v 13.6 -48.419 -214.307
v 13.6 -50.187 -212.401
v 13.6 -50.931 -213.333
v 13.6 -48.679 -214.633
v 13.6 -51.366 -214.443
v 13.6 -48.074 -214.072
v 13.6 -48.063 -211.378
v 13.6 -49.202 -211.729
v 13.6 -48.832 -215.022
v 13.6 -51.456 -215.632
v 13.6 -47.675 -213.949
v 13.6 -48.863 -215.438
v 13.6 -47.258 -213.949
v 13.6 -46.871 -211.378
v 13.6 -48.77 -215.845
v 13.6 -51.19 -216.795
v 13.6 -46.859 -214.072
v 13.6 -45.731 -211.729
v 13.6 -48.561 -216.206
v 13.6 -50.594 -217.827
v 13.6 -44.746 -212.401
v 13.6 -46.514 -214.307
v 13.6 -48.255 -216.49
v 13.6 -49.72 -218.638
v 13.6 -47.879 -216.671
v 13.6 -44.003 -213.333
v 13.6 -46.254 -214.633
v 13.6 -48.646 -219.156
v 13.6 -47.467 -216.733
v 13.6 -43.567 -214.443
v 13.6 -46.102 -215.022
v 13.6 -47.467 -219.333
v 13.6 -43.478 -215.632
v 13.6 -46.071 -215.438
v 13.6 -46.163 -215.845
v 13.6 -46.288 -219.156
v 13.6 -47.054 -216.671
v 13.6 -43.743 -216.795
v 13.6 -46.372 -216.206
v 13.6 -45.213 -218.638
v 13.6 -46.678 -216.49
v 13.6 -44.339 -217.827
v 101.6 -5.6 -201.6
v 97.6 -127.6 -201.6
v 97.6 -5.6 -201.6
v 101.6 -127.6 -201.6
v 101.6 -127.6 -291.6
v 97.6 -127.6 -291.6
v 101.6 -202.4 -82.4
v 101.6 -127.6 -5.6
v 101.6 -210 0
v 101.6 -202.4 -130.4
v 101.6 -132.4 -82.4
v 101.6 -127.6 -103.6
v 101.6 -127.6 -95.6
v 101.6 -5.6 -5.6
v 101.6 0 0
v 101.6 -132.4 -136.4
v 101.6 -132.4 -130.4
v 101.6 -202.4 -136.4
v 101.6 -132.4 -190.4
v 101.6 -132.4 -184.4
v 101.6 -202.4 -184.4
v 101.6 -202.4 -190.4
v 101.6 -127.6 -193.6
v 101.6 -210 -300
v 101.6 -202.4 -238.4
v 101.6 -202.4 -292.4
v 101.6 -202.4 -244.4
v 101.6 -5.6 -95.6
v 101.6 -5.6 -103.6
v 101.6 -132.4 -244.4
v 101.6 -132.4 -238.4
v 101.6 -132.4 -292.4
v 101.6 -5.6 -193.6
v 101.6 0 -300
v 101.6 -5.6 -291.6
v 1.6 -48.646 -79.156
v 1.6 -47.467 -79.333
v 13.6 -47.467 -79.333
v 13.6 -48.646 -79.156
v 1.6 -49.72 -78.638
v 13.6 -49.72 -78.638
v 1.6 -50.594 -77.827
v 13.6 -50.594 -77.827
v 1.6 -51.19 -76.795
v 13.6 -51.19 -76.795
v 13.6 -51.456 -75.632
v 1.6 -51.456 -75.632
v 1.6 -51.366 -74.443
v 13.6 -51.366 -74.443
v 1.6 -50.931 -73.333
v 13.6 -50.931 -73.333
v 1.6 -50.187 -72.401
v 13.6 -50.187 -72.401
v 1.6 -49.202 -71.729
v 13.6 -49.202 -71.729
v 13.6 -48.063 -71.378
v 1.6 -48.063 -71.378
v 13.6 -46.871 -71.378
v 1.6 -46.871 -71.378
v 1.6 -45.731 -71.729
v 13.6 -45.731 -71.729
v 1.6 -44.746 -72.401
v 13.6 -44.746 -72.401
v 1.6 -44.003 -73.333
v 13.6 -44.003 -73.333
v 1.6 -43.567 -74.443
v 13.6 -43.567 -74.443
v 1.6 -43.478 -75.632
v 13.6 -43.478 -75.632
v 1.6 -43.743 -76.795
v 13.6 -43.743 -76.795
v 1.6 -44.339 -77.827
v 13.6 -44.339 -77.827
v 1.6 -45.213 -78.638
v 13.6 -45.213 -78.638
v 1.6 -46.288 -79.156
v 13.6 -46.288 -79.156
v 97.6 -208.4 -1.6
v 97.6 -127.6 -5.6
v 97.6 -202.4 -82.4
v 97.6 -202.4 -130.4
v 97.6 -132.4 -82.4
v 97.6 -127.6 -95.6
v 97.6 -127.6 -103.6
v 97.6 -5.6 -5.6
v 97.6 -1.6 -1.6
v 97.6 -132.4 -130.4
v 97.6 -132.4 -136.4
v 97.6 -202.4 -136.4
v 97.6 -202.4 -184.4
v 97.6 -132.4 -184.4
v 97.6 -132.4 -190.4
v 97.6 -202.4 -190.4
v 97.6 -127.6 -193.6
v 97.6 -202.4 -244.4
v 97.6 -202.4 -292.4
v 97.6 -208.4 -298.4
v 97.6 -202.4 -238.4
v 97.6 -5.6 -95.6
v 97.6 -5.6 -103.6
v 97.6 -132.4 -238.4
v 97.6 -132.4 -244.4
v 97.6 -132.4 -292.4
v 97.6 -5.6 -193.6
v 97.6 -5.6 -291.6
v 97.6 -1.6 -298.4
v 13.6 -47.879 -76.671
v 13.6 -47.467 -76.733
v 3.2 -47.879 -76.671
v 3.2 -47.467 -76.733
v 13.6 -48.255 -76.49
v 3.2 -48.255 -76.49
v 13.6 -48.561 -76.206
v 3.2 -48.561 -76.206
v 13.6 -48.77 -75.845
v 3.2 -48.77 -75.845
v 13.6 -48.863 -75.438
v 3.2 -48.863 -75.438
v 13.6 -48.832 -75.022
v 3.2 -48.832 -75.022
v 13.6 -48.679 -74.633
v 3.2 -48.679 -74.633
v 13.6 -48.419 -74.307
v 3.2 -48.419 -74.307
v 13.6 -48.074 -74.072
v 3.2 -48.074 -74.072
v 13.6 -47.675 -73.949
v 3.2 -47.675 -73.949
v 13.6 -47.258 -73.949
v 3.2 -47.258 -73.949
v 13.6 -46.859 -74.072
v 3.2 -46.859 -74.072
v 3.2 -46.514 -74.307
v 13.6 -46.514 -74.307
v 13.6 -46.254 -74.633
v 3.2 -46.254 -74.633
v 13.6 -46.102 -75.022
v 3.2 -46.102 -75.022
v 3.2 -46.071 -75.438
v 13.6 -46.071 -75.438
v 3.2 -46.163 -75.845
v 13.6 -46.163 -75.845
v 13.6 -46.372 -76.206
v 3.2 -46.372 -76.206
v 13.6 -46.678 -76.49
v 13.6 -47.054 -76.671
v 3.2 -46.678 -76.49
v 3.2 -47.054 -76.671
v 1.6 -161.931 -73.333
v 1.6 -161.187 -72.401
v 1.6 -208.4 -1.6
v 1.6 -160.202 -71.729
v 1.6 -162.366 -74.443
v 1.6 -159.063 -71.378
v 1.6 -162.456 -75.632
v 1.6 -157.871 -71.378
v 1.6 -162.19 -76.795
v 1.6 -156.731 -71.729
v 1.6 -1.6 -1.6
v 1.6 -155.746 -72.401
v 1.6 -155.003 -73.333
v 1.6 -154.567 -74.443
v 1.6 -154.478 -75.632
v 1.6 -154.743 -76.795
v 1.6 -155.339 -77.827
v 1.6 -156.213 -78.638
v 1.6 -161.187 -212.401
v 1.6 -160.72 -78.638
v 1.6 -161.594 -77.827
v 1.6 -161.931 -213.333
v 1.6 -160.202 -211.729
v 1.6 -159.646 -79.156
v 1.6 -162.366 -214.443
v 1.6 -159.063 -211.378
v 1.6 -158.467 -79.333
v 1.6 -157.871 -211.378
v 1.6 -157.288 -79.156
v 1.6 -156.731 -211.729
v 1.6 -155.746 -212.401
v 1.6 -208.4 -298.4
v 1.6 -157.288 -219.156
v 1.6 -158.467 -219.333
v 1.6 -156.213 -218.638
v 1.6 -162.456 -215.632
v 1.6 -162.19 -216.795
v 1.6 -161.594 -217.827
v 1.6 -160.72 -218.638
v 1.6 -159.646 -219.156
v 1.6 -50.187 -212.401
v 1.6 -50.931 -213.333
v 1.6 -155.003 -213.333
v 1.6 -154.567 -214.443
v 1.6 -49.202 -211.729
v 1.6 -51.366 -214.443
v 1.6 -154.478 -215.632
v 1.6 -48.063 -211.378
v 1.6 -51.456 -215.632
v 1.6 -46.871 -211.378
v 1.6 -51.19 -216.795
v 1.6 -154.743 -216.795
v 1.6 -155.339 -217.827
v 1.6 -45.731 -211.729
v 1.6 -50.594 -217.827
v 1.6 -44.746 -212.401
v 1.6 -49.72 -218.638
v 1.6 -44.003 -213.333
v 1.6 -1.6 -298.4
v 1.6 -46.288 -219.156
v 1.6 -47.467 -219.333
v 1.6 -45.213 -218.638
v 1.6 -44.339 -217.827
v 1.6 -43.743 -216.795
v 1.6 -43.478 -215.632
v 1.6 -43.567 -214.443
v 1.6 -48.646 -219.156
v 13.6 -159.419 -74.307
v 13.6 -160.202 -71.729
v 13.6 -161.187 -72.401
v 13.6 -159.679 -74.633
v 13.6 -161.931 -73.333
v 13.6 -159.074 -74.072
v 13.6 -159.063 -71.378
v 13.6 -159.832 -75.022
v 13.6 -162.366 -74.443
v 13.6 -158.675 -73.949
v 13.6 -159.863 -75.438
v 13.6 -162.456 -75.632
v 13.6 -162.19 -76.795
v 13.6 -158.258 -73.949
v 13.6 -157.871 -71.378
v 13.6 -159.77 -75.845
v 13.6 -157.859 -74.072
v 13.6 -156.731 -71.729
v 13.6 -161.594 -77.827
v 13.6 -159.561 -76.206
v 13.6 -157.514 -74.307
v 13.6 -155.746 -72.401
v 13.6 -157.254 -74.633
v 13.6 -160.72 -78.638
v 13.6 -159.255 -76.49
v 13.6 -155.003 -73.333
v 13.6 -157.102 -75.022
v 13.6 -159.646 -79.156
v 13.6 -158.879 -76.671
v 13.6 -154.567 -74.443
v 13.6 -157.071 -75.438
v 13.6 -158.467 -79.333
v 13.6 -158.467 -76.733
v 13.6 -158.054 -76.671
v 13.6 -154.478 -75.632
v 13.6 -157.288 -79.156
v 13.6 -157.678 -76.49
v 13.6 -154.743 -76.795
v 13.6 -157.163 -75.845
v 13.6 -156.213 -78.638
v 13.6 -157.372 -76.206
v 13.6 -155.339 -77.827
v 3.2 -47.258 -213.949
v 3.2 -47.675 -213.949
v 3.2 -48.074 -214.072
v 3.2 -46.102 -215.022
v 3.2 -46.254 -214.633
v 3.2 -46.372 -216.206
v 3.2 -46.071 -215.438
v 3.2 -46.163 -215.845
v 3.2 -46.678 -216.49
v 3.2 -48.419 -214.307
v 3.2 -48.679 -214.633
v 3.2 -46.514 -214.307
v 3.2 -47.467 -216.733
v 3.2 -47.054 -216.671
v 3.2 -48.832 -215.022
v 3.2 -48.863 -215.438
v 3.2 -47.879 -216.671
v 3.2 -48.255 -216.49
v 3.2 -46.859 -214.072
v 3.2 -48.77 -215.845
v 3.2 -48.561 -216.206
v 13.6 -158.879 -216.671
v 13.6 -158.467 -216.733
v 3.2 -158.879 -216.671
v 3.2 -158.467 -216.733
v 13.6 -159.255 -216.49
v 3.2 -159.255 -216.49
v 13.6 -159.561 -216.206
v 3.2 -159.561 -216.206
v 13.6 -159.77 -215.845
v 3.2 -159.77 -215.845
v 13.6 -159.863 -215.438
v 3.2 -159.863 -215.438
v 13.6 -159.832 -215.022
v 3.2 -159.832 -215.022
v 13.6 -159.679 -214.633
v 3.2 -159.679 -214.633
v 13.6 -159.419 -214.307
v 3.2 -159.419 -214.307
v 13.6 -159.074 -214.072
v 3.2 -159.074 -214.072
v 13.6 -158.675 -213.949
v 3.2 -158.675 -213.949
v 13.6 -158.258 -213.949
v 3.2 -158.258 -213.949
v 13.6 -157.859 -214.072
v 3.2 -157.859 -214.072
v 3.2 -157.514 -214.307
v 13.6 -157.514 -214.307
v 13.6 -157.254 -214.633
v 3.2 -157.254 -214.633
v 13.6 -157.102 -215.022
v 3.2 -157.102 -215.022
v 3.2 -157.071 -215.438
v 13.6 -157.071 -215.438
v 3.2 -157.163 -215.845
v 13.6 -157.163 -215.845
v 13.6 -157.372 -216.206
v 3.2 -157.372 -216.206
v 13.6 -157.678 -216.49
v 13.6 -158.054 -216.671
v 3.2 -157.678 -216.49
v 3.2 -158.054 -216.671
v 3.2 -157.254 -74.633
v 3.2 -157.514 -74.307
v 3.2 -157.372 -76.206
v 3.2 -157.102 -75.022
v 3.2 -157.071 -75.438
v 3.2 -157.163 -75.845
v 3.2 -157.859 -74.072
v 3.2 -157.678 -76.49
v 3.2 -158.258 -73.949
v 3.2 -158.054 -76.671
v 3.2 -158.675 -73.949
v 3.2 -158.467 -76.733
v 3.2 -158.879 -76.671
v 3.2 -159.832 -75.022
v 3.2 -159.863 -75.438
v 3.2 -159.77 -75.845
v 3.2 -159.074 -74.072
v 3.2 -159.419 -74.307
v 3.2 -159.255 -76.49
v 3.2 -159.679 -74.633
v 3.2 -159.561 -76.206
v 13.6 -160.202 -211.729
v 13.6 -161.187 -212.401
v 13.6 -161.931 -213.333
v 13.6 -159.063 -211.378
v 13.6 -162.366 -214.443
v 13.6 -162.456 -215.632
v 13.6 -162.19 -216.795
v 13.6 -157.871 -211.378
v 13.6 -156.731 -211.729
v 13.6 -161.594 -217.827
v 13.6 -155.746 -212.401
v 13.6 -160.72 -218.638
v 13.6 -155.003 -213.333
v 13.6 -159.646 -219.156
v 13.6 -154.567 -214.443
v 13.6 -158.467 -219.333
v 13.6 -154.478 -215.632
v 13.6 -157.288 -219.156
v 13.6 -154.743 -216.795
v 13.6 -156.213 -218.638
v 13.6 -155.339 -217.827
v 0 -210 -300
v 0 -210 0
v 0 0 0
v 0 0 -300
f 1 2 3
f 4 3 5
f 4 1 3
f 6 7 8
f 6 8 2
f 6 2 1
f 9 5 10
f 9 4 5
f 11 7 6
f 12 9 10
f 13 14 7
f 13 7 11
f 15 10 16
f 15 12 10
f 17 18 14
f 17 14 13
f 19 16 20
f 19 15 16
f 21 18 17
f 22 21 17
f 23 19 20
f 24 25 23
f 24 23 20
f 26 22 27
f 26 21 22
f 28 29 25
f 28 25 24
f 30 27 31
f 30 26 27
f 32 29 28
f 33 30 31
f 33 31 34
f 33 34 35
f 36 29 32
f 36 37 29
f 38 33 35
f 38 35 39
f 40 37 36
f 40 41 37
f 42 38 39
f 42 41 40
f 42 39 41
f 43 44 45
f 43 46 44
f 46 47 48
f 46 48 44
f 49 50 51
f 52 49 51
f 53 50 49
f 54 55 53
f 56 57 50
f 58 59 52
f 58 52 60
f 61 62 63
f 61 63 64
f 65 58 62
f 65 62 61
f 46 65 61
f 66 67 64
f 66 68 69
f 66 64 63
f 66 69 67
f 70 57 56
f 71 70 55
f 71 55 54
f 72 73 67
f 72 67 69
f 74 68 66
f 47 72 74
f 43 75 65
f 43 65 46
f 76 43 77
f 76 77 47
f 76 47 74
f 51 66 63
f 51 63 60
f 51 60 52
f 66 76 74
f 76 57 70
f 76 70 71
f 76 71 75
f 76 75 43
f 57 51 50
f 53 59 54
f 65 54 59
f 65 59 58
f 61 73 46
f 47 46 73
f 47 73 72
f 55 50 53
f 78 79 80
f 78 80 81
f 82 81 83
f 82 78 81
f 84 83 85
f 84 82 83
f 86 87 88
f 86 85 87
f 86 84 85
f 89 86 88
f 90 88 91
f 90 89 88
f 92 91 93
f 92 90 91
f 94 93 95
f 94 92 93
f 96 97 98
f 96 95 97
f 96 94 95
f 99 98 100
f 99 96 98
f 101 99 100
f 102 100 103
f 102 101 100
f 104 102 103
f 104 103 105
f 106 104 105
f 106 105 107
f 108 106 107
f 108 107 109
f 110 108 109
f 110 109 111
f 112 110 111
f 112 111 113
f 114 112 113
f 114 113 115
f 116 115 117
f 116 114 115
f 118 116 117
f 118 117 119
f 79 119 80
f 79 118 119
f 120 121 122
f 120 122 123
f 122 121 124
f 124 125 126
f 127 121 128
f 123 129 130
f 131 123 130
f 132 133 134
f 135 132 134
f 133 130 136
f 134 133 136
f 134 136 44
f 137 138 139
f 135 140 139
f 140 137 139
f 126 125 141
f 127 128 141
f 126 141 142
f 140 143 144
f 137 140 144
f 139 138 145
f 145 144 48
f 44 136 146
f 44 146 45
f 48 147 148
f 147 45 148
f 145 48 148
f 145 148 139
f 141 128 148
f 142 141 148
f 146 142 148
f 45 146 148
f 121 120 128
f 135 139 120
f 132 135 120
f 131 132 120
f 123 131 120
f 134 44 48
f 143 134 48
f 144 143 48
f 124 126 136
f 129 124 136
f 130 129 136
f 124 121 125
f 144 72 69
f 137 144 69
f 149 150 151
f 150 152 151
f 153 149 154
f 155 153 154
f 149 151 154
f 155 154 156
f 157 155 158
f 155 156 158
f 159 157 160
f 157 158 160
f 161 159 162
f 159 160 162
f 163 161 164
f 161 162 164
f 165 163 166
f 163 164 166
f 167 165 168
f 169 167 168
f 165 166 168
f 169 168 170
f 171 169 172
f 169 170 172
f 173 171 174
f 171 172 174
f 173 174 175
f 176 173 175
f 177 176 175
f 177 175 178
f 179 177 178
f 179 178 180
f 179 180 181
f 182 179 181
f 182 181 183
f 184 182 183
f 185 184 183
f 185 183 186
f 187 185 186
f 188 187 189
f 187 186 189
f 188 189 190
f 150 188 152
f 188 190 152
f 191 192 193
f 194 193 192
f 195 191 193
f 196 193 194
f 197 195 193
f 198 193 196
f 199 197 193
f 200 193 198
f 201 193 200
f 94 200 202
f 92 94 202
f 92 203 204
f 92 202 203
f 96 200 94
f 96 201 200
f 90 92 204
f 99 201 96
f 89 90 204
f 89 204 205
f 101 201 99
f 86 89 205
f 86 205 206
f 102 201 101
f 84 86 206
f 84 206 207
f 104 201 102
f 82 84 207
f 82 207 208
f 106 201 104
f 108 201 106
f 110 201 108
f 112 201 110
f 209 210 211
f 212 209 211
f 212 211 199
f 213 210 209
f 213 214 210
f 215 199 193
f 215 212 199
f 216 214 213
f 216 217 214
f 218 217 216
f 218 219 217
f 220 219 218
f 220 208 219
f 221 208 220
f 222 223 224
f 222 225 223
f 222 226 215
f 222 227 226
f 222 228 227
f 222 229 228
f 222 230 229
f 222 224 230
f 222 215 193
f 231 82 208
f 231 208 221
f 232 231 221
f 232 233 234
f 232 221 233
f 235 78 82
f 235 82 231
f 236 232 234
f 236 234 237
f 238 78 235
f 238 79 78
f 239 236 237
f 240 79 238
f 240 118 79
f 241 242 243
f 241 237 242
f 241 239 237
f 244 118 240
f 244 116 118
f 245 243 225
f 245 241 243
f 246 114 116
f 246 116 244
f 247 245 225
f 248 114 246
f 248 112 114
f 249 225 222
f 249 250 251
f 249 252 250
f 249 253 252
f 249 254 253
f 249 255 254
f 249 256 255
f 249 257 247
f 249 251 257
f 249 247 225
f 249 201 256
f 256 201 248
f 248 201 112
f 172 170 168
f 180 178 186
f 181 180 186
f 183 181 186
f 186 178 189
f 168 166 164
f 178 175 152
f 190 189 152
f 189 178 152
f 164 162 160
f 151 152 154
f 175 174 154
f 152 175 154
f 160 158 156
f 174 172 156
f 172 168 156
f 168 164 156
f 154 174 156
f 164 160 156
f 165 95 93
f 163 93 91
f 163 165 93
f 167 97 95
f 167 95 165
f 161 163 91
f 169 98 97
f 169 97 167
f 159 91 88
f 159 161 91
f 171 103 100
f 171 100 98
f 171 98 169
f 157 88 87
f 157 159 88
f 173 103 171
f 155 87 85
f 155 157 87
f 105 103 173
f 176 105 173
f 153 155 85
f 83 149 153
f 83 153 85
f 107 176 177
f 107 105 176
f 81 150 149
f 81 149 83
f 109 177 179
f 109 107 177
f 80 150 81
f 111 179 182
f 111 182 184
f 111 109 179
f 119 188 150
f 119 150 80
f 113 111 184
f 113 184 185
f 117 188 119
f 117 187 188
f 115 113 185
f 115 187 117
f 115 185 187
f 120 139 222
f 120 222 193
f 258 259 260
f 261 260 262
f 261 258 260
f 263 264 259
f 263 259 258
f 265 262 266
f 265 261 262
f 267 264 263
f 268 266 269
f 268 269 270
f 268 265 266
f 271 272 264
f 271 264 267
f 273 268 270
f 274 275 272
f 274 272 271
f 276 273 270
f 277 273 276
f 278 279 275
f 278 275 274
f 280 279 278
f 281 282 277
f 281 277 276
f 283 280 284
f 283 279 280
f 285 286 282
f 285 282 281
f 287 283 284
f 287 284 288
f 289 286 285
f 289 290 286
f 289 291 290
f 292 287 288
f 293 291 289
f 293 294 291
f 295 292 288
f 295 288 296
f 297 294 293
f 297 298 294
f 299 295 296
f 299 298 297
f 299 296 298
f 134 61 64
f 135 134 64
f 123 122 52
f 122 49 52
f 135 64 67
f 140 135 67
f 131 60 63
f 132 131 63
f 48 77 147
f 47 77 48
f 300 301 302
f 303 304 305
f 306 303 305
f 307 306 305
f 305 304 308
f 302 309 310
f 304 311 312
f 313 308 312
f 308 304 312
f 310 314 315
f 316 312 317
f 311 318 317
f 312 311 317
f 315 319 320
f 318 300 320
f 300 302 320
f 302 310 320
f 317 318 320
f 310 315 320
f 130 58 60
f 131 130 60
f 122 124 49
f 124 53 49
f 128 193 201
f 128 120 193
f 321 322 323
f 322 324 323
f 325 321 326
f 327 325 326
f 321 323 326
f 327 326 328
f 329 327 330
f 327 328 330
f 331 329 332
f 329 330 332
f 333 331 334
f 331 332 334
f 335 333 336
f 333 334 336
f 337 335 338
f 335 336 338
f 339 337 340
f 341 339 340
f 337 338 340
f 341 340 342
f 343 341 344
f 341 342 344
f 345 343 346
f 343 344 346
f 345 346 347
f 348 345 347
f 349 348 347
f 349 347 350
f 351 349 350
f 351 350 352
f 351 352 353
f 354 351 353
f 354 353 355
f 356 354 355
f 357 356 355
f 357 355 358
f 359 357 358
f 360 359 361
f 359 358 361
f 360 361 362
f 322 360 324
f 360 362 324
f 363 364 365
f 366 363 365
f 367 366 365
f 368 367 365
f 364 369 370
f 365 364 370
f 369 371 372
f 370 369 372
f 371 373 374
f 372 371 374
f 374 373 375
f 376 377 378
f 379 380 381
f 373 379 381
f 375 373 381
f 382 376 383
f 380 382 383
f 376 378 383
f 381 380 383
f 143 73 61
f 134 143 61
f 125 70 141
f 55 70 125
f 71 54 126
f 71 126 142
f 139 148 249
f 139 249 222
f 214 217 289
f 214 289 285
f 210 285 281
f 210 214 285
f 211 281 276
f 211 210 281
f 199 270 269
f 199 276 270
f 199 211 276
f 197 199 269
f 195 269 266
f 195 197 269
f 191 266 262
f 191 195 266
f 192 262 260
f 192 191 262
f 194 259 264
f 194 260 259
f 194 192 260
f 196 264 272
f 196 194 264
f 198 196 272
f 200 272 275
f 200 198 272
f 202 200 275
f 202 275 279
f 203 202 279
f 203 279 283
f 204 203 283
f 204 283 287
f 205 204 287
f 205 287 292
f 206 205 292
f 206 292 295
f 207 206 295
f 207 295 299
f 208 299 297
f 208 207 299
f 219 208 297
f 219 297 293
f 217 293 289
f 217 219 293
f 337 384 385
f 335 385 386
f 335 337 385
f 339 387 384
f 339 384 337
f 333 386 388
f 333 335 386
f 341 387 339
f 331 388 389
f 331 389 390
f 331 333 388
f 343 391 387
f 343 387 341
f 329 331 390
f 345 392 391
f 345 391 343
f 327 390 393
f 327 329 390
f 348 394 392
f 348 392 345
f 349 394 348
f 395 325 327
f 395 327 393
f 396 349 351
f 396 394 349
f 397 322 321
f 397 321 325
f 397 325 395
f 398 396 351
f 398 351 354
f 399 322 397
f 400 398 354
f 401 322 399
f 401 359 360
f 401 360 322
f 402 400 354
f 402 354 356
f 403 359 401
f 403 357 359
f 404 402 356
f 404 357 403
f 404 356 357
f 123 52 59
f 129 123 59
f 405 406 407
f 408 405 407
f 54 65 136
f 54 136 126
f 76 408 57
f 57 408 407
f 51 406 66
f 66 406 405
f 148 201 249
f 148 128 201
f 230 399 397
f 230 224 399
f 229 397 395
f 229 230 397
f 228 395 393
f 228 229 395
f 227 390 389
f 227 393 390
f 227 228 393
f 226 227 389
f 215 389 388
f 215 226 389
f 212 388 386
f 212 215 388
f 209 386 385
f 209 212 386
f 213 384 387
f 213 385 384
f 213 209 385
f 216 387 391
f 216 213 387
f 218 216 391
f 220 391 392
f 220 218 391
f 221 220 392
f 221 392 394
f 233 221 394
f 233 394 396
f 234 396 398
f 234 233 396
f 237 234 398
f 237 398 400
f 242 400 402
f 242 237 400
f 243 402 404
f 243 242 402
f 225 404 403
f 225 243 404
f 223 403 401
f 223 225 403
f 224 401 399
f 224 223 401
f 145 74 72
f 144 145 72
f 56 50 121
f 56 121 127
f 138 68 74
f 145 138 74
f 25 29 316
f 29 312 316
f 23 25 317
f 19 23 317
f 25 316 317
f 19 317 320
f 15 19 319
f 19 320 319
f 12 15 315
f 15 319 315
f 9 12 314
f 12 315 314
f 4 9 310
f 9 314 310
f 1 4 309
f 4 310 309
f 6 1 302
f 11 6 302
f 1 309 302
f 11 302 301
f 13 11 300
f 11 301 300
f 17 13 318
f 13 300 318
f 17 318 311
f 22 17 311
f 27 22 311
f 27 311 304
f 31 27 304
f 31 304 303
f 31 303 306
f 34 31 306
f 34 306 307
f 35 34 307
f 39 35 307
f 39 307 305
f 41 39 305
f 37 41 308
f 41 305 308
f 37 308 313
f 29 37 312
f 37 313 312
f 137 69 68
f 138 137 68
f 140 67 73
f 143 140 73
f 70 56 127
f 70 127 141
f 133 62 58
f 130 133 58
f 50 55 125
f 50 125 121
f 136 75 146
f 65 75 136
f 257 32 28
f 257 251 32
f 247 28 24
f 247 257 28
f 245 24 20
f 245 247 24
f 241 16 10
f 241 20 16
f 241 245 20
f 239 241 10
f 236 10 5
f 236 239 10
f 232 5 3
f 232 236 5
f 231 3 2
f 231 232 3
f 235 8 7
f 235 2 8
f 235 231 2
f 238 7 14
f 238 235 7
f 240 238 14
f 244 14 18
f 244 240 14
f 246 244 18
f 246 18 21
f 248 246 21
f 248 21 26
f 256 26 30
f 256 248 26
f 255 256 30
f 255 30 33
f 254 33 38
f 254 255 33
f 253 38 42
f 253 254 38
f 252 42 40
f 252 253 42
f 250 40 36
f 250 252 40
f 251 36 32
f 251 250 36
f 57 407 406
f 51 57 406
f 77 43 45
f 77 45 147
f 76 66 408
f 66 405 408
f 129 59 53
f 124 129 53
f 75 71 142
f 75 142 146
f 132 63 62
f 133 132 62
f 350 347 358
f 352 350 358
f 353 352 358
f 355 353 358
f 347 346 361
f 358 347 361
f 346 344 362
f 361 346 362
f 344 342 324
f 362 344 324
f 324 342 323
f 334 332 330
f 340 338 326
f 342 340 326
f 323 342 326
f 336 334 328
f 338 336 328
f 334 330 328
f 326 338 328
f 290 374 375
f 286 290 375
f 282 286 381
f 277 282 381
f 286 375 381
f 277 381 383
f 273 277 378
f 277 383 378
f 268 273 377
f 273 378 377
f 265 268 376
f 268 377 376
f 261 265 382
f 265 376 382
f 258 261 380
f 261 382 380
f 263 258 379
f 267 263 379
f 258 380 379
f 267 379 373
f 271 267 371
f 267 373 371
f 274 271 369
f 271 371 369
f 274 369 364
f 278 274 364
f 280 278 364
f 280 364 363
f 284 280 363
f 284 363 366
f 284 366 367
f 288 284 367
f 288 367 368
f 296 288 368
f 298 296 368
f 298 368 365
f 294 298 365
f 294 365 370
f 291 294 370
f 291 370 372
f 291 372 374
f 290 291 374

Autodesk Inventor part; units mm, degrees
ref_plane "YZ Plane" through (0, 0, 0) normal (1, 0, 0) x (0, 1, 0)
ref_plane "XZ Plane" through (0, 0, 0) normal (0, 1, 0) x (-1, 0, 0)
ref_plane "XY Plane" through (0, 0, 0) normal (0, 0, 1) x (1, 0, 0)
sketch "Sketch1" plane through (0, 0, 0) normal (1, 0, 0) x (0, 1, 0)
  line L0 (0, 0) -> (-210, 0)
  line L1 (-210, 0) -> (-210, -300)
  line L2 (-210, -300) -> (0, -300)
  line L3 (0, -300) -> (0, 0)
  dimension "d0" = 210
  dimension "d1" = 300
extrude "Extrusion1" add sketch "Sketch1" along normal blind 101.6
sketch "Sketch2" plane through (101.6, 0, 0) normal (1, 0, 0) x (0, 0, -1)
  line L0 (0, -210) -> (300, -210) projected
  line L1 (300, -210) -> (300, 0) projected
  line L2 (300, 0) -> (0, 0) projected
  line L3 (0, 0) -> (0, -210) projected
  line L4 (1.6, -1.6) -> (298.4, -1.6)
  line L5 (298.4, -1.6) -> (298.4, -208.4)
  line L6 (298.4, -208.4) -> (1.6, -208.4)
  line L7 (1.6, -208.4) -> (1.6, -1.6)
  dimension "d4" = 1.6
extrude "Extrusion2" cut sketch "Sketch2" against normal blind 100 contours L4 L5 L6 L7
sketch "Sketch3" plane through (1.6, 0, 0) normal (1, 0, 0) x (0, 0, -1)
  circle A0 centre (75.3333, -47.4667) radius 4
  circle A1 centre (215.3333, -47.4667) radius 4
  circle A2 centre (215.3333, -158.4667) radius 4
  circle A3 centre (75.3333, -158.4667) radius 4
  point P0 (0, 0)
  dimension "d7" = 8
  dimension "d8" = 8
  dimension "d9" = 8
  dimension "d10" = 8
  dimension "d11" = 140
  dimension "d12" = 111
extrude "Extrusion3" add sketch "Sketch3" along normal blind 12
sketch "Sketch4" plane through (13.6, -47.4667, -75.3333) normal (1, 0, 0) x (0, 0, -1)
  circle A0 centre (0, 0) radius 4 projected
  circle A1 centre (140, 0) radius 4 projected
  circle A2 centre (140, -111) radius 4 projected
  circle A3 centre (0, -111) radius 4 projected
  point P0 (-75.3333, 47.4667)
hole "Hole1" at (13.6, -47.4667, -75.3333) at (13.6, -47.4667, -215.3333) at (13.6, -158.4667, -215.3333) at (13.6, -158.4667, -75.3333) direction (-1, 0, 0) diameter 2.8 depth 10.4
sketch "Sketch5" plane through (101.6, 0, 0) normal (1, 0, 0) x (0, 0, -1)
  line L0 (5.6, -5.6) -> (95.6, -5.6)
  line L1 (95.6, -5.6) -> (95.6, -127.6)
  line L2 (95.6, -127.6) -> (5.6, -127.6)
  line L3 (5.6, -127.6) -> (5.6, -5.6)
  line L4 (1.6, -208.4) -> (1.6, -1.6) projected
  line L5 (1.6, -1.6) -> (298.4, -1.6) projected
  line L6 (103.6, -5.6) -> (193.6, -5.6)
  line L7 (103.6, -127.6) -> (103.6, -5.6)
  line L8 (193.6, -5.6) -> (193.6, -127.6)
  line L9 (193.6, -127.6) -> (103.6, -127.6)
  line L10 (201.6, -5.6) -> (291.6, -5.6)
  line L11 (201.6, -127.6) -> (201.6, -5.6)
  line L12 (291.6, -5.6) -> (291.6, -127.6)
  line L13 (291.6, -127.6) -> (201.6, -127.6)
  line L14 (298.4, -1.6) -> (298.4, -208.4) projected
  line L15 (292.4, -132.4) -> (244.4, -132.4)
  line L16 (244.4, -132.4) -> (244.4, -202.4)
  line L17 (244.4, -202.4) -> (292.4, -202.4)
  line L18 (292.4, -202.4) -> (292.4, -132.4)
  line L19 (298.4, -208.4) -> (1.6, -208.4) projected
  line L20 (190.4, -132.4) -> (190.4, -202.4)
  line L21 (238.4, -132.4) -> (190.4, -132.4)
  line L22 (238.4, -202.4) -> (238.4, -132.4)
  line L23 (190.4, -202.4) -> (238.4, -202.4)
  line L24 (136.4, -132.4) -> (136.4, -202.4)
  line L25 (184.4, -132.4) -> (136.4, -132.4)
  line L26 (184.4, -202.4) -> (184.4, -132.4)
  line L27 (136.4, -202.4) -> (184.4, -202.4)
  line L28 (82.4, -132.4) -> (82.4, -202.4)
  line L29 (130.4, -132.4) -> (82.4, -132.4)
  line L30 (130.4, -202.4) -> (130.4, -132.4)
  line L31 (82.4, -202.4) -> (130.4, -202.4)
  point P0 (0, 0)
  point P1 (268.4, -202.4)
  point P2 (214.4, -202.4)
  point P3 (160.4, -202.4)
  point P4 (106.4, -202.4)
  dimension "d22" = 90
  dimension "d23" = 122
  dimension "d24" = 4
  dimension "d25" = 4
  dimension "d28" = 98
  dimension "d33" = 6.8
  dimension "d34" = 48
  dimension "d35" = 70
  dimension "d36" = 6
  dimension "d37" = 6
  dimension "d40" = 54
extrude "Extrusion4" add sketch "Sketch5" against normal blind 4
equation "\"d8\" = d7"
equation "\"d9\" = d7"
equation "\"d10\" = d7"
equation "\"d25\" = d24"
equation "\"d37\" = d36"
